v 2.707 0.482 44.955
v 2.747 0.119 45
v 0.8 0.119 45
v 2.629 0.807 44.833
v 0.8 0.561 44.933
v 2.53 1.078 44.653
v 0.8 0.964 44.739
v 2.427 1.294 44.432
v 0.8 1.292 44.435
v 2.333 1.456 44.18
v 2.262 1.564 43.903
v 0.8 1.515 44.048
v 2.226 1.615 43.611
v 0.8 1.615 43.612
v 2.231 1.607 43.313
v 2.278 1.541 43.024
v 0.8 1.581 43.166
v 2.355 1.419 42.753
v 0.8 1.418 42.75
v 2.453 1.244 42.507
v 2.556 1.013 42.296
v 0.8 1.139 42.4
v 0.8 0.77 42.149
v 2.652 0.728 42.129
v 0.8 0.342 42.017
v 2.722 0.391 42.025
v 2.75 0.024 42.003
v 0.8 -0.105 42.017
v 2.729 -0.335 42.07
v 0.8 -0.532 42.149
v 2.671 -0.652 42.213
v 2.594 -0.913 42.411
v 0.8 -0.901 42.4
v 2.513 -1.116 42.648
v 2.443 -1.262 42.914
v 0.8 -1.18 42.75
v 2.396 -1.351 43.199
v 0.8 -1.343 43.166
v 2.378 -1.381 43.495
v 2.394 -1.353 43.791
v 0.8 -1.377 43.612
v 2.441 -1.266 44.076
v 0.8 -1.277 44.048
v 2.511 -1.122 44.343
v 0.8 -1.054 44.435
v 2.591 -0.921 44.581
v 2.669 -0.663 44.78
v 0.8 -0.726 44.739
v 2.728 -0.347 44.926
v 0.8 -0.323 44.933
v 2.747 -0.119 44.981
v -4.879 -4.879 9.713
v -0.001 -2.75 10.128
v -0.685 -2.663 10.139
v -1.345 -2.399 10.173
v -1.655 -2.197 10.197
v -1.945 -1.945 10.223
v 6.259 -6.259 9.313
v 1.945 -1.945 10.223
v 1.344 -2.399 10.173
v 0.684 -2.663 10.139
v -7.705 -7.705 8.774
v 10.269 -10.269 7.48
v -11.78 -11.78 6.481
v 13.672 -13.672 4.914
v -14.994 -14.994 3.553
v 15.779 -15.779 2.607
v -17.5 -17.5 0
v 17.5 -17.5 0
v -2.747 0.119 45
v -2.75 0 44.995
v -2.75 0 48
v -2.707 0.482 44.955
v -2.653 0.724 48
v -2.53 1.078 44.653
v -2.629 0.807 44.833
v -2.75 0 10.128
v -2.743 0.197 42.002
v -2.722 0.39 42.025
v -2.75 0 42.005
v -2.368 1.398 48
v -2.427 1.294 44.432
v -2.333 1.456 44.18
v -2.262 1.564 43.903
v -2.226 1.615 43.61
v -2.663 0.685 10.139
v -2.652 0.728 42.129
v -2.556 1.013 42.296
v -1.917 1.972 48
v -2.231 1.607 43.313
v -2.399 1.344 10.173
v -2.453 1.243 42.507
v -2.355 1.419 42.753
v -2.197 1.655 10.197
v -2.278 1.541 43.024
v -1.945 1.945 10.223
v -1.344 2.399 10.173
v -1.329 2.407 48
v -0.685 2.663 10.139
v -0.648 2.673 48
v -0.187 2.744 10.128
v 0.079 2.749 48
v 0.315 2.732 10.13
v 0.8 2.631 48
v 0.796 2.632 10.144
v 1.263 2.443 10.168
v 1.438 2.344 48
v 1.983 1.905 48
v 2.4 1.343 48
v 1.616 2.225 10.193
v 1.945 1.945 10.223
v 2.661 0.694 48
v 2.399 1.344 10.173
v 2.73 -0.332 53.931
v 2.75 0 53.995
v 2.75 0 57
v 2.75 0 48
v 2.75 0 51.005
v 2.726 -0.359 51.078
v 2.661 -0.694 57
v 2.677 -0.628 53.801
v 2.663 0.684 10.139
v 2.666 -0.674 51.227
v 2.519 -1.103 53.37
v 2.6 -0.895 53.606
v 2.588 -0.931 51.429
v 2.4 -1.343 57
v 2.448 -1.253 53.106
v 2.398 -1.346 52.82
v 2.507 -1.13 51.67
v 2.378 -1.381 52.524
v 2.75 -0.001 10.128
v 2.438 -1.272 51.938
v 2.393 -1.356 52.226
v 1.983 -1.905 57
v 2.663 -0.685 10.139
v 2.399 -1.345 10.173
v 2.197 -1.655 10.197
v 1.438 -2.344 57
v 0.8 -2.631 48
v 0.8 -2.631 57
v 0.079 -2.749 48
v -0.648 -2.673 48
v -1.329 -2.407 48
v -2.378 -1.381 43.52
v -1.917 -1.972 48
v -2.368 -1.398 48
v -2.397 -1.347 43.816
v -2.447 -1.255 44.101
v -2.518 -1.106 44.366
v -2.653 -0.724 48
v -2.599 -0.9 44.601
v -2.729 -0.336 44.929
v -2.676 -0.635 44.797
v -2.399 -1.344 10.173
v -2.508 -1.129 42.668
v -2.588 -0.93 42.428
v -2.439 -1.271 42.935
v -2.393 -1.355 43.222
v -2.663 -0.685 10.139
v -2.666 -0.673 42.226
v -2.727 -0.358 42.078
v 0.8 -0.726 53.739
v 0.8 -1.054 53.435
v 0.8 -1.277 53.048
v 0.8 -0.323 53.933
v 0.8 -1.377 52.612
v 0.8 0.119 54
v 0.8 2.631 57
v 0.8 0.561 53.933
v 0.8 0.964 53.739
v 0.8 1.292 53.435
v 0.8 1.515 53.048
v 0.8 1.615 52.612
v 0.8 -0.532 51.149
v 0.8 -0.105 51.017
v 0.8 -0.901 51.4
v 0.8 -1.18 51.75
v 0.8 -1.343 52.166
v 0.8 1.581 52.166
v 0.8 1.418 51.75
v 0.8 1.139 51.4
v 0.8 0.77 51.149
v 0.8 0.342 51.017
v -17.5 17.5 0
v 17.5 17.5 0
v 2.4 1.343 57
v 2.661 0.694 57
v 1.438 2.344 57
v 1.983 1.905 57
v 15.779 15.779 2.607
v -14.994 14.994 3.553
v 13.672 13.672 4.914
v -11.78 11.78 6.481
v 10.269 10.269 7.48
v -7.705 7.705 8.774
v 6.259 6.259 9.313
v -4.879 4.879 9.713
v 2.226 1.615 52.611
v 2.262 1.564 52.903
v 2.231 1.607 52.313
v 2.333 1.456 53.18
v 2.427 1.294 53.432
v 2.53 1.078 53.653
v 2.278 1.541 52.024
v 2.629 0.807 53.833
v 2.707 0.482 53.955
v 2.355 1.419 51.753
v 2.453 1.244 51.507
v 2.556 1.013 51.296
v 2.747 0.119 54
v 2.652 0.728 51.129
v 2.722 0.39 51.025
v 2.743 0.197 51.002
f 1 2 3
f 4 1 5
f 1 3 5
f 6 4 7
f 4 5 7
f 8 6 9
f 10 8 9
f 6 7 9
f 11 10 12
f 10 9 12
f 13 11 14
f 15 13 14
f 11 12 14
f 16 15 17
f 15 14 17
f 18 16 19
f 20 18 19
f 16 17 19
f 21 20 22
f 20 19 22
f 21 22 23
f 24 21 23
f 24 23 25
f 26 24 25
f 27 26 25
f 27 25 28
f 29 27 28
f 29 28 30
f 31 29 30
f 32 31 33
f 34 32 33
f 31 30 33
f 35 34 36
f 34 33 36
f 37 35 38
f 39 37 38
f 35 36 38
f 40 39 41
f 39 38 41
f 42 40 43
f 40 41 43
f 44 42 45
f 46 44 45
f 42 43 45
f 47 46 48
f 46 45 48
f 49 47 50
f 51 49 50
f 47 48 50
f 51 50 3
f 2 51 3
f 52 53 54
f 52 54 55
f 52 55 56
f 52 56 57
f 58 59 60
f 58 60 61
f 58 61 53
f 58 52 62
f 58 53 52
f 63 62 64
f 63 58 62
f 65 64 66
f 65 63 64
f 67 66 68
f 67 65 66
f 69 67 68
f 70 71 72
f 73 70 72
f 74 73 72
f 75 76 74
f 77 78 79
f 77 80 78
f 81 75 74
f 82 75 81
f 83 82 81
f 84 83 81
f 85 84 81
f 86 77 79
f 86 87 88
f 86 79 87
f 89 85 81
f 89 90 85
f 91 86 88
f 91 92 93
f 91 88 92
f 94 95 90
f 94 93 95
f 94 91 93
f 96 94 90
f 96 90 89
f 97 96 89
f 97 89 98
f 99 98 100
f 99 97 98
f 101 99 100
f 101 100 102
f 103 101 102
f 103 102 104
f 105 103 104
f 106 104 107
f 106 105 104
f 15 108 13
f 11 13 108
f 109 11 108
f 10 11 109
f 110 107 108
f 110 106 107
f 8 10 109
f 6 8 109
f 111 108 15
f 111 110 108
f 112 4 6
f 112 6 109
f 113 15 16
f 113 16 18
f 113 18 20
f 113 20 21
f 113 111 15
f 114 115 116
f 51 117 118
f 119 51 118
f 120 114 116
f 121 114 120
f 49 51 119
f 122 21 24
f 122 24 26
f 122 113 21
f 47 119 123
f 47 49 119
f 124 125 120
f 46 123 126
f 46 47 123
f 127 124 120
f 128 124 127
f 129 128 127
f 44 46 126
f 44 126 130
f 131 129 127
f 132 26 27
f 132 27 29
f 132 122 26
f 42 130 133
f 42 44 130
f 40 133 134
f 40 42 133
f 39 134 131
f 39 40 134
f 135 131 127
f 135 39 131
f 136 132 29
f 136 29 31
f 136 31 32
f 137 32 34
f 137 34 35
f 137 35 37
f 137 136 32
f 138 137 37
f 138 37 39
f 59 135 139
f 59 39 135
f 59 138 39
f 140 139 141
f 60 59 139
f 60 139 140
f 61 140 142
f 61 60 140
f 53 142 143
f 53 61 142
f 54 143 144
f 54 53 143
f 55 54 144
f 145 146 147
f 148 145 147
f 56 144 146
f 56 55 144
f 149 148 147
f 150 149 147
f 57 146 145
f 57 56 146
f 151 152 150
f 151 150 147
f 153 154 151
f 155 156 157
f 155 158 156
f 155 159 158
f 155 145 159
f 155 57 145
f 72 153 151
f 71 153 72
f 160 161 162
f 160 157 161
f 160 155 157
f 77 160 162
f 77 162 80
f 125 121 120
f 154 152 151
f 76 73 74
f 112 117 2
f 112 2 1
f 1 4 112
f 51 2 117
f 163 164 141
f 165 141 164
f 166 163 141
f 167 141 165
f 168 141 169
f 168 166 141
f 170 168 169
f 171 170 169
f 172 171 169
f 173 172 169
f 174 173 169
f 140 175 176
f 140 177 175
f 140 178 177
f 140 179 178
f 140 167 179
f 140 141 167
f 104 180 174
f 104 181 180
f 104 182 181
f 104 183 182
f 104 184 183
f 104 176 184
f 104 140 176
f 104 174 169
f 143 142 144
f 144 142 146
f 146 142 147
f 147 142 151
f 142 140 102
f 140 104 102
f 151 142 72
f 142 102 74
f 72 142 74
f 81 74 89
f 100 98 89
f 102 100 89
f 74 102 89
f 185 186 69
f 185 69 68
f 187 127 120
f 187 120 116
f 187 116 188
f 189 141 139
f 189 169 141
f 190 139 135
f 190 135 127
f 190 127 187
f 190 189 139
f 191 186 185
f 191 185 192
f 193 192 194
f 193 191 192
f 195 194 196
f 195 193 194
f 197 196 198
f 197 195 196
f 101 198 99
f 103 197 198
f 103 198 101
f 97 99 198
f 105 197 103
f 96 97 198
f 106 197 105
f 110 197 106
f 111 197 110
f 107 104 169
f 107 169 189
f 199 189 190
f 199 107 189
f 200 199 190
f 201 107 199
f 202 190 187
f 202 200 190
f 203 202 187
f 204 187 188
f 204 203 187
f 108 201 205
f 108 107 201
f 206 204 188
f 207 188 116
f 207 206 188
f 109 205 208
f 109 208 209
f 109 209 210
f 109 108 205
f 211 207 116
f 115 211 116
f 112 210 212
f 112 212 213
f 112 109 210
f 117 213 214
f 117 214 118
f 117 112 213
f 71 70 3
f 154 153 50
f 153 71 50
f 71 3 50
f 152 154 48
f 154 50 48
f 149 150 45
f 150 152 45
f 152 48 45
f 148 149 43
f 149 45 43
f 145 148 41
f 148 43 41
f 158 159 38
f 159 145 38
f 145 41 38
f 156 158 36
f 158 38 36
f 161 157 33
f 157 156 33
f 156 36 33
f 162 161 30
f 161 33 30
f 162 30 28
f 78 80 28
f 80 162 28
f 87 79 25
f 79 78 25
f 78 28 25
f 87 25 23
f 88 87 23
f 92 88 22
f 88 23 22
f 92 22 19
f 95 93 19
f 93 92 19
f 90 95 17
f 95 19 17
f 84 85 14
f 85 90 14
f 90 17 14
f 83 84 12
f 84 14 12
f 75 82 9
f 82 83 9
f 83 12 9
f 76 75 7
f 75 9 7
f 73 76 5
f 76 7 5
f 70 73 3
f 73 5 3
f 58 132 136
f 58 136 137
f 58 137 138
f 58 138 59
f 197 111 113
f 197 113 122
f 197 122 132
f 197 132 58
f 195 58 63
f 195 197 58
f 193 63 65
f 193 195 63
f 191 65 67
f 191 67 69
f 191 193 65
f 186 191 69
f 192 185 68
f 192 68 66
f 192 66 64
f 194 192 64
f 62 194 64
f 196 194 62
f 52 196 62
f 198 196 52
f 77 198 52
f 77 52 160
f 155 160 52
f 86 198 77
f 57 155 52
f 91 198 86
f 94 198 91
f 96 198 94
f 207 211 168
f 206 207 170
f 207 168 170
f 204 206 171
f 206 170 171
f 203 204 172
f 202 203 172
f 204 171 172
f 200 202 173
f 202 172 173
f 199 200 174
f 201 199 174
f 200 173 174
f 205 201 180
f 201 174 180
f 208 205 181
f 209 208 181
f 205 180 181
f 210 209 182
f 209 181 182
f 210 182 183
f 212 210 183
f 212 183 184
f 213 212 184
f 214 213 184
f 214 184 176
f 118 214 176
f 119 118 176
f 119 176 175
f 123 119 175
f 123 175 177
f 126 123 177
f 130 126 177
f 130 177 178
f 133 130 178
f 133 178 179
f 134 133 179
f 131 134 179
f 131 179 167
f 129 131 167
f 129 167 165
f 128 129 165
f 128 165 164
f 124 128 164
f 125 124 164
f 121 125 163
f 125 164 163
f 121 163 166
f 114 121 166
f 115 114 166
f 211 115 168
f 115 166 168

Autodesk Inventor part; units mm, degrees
ref_plane "XZ Plane" through (0, 0, 0) normal (0, 1, 0) x (-1, 0, 0)
ref_plane "XY Plane" through (0, 0, 0) normal (0, 0, 1) x (1, 0, 0)
sketch "Sketch1" plane through (0, 0, 0) normal (0, 1, 0) x (-1, 0, 0)
  line L0 (0, 0) -> (3, 0)
  line L1 (3, 0) -> (3, 50)
  line L2 (3, 50) -> (0, 50)
  line L3 (0, 50) -> (0, 0)
  dimension "d0" = 3
  dimension "d1" = 50
revolve "Revolution1" add sketch "Sketch1" angle 360 about axis through (0, 0, 50) along (0, 0, -1)
sketch "Sketch2" plane through (0, 0, 0) normal (0, 0, -1) x (-1, 0, 0)
  line L0 (-17.5, 17.5) -> (17.5, 17.5)
  line L1 (17.5, 17.5) -> (17.5, -17.5)
  line L2 (17.5, -17.5) -> (-17.5, -17.5)
  line L3 (-17.5, -17.5) -> (-17.5, 17.5)
  line L4 (-17.5, 17.5) -> (17.5, -17.5) construction
  line L5 (17.5, 17.5) -> (-17.5, -17.5) construction
  point P0 (0, 0)
  dimension "d6" = 35
  dimension "d7" = 35
extrude "Extrusion1" add sketch "Sketch2" against normal blind 14
sketch "Sketch3" plane through (-17.5, 17.5, 0) normal (0, 1, 0) x (1, 0, 0)
  line L0 (35, 0) -> (35, -14) projected
  line L1 (0, 0) -> (35, 0)
  arc A0 (0, 0) -> (35, 0) centre (17.5, 9.6825) ccw
  point P0 (17.5, 0)
  dimension "d10" = 20
  dimension "d11" = 17.5
extrude "Extrusion2" cut sketch "Sketch3" against normal through all keep common part
sketch "Sketch4" plane through (17.5, -17.5, 0) normal (1, 0, 0) x (0, 0, -1)
  line L0 (0, 35) -> (0, 0) projected
  line L1 (0, 35) -> (0, 0)
  arc A0 (0, 35) -> (0, 0) centre (9.6825, 17.5) ccw
  point P0 (0, 17.5)
  dimension "d14" = 20
extrude "Extrusion3" cut sketch "Sketch4" against normal through all keep common part
sketch "Sketch5" plane through (17.5, 17.5, 0) normal (0, 0, -1) x (-1, 0, 0)
  line L0 (35, 0) -> (17.5, -17.5) projected
  circle A0 centre (17.5, -17.5) radius 2.75
  dimension "d17" = 5.5
extrude "Extrusion4" add sketch "Sketch5" against normal blind 48
ref_plane "Work Plane1" through (0, 0, 0) normal (1, 0, 0) x (0, 1, 0)
sketch "Sketch6" plane through (0, 0, 48) normal (0, 0, 1) x (1, 0, 0)
  circle A0 centre (0, 0) radius 2.75 projected
  line L0 (0.8, -2.6311) -> (0.8, 2.6311)
  arc A1 (0.8, -2.6311) -> (0.8, 2.6311) centre (0, 0) ccw
  point P0 (0, 0)
  dimension "d28" = 0.8
extrude "Extrusion5" add sketch "Sketch6" along normal blind 9 contours A0 L0 picked at (0.979, 0.801)
sketch "Sketch7" plane through (0.8, -2.6311, 48) normal (-1, 0, 0) x (0, 0, 1)
  circle A0 centre (4.5, 2.75) radius 1.5
  line L0 (9, 5.2621) -> (9, 0) projected
  circle A1 centre (-4.5, 2.75) radius 1.5
  point P0 (-48, 2.6311)
  dimension "d23" = 3
  dimension "d24" = 4.5
  dimension "d31" = 3
  dimension "d32" = 9
extrude "Extrusion6" cut sketch "Sketch7" along normal through all both and the other way through all
equation "\"d7\" = d6"
properties part number "thumper-bumper-plunger"
